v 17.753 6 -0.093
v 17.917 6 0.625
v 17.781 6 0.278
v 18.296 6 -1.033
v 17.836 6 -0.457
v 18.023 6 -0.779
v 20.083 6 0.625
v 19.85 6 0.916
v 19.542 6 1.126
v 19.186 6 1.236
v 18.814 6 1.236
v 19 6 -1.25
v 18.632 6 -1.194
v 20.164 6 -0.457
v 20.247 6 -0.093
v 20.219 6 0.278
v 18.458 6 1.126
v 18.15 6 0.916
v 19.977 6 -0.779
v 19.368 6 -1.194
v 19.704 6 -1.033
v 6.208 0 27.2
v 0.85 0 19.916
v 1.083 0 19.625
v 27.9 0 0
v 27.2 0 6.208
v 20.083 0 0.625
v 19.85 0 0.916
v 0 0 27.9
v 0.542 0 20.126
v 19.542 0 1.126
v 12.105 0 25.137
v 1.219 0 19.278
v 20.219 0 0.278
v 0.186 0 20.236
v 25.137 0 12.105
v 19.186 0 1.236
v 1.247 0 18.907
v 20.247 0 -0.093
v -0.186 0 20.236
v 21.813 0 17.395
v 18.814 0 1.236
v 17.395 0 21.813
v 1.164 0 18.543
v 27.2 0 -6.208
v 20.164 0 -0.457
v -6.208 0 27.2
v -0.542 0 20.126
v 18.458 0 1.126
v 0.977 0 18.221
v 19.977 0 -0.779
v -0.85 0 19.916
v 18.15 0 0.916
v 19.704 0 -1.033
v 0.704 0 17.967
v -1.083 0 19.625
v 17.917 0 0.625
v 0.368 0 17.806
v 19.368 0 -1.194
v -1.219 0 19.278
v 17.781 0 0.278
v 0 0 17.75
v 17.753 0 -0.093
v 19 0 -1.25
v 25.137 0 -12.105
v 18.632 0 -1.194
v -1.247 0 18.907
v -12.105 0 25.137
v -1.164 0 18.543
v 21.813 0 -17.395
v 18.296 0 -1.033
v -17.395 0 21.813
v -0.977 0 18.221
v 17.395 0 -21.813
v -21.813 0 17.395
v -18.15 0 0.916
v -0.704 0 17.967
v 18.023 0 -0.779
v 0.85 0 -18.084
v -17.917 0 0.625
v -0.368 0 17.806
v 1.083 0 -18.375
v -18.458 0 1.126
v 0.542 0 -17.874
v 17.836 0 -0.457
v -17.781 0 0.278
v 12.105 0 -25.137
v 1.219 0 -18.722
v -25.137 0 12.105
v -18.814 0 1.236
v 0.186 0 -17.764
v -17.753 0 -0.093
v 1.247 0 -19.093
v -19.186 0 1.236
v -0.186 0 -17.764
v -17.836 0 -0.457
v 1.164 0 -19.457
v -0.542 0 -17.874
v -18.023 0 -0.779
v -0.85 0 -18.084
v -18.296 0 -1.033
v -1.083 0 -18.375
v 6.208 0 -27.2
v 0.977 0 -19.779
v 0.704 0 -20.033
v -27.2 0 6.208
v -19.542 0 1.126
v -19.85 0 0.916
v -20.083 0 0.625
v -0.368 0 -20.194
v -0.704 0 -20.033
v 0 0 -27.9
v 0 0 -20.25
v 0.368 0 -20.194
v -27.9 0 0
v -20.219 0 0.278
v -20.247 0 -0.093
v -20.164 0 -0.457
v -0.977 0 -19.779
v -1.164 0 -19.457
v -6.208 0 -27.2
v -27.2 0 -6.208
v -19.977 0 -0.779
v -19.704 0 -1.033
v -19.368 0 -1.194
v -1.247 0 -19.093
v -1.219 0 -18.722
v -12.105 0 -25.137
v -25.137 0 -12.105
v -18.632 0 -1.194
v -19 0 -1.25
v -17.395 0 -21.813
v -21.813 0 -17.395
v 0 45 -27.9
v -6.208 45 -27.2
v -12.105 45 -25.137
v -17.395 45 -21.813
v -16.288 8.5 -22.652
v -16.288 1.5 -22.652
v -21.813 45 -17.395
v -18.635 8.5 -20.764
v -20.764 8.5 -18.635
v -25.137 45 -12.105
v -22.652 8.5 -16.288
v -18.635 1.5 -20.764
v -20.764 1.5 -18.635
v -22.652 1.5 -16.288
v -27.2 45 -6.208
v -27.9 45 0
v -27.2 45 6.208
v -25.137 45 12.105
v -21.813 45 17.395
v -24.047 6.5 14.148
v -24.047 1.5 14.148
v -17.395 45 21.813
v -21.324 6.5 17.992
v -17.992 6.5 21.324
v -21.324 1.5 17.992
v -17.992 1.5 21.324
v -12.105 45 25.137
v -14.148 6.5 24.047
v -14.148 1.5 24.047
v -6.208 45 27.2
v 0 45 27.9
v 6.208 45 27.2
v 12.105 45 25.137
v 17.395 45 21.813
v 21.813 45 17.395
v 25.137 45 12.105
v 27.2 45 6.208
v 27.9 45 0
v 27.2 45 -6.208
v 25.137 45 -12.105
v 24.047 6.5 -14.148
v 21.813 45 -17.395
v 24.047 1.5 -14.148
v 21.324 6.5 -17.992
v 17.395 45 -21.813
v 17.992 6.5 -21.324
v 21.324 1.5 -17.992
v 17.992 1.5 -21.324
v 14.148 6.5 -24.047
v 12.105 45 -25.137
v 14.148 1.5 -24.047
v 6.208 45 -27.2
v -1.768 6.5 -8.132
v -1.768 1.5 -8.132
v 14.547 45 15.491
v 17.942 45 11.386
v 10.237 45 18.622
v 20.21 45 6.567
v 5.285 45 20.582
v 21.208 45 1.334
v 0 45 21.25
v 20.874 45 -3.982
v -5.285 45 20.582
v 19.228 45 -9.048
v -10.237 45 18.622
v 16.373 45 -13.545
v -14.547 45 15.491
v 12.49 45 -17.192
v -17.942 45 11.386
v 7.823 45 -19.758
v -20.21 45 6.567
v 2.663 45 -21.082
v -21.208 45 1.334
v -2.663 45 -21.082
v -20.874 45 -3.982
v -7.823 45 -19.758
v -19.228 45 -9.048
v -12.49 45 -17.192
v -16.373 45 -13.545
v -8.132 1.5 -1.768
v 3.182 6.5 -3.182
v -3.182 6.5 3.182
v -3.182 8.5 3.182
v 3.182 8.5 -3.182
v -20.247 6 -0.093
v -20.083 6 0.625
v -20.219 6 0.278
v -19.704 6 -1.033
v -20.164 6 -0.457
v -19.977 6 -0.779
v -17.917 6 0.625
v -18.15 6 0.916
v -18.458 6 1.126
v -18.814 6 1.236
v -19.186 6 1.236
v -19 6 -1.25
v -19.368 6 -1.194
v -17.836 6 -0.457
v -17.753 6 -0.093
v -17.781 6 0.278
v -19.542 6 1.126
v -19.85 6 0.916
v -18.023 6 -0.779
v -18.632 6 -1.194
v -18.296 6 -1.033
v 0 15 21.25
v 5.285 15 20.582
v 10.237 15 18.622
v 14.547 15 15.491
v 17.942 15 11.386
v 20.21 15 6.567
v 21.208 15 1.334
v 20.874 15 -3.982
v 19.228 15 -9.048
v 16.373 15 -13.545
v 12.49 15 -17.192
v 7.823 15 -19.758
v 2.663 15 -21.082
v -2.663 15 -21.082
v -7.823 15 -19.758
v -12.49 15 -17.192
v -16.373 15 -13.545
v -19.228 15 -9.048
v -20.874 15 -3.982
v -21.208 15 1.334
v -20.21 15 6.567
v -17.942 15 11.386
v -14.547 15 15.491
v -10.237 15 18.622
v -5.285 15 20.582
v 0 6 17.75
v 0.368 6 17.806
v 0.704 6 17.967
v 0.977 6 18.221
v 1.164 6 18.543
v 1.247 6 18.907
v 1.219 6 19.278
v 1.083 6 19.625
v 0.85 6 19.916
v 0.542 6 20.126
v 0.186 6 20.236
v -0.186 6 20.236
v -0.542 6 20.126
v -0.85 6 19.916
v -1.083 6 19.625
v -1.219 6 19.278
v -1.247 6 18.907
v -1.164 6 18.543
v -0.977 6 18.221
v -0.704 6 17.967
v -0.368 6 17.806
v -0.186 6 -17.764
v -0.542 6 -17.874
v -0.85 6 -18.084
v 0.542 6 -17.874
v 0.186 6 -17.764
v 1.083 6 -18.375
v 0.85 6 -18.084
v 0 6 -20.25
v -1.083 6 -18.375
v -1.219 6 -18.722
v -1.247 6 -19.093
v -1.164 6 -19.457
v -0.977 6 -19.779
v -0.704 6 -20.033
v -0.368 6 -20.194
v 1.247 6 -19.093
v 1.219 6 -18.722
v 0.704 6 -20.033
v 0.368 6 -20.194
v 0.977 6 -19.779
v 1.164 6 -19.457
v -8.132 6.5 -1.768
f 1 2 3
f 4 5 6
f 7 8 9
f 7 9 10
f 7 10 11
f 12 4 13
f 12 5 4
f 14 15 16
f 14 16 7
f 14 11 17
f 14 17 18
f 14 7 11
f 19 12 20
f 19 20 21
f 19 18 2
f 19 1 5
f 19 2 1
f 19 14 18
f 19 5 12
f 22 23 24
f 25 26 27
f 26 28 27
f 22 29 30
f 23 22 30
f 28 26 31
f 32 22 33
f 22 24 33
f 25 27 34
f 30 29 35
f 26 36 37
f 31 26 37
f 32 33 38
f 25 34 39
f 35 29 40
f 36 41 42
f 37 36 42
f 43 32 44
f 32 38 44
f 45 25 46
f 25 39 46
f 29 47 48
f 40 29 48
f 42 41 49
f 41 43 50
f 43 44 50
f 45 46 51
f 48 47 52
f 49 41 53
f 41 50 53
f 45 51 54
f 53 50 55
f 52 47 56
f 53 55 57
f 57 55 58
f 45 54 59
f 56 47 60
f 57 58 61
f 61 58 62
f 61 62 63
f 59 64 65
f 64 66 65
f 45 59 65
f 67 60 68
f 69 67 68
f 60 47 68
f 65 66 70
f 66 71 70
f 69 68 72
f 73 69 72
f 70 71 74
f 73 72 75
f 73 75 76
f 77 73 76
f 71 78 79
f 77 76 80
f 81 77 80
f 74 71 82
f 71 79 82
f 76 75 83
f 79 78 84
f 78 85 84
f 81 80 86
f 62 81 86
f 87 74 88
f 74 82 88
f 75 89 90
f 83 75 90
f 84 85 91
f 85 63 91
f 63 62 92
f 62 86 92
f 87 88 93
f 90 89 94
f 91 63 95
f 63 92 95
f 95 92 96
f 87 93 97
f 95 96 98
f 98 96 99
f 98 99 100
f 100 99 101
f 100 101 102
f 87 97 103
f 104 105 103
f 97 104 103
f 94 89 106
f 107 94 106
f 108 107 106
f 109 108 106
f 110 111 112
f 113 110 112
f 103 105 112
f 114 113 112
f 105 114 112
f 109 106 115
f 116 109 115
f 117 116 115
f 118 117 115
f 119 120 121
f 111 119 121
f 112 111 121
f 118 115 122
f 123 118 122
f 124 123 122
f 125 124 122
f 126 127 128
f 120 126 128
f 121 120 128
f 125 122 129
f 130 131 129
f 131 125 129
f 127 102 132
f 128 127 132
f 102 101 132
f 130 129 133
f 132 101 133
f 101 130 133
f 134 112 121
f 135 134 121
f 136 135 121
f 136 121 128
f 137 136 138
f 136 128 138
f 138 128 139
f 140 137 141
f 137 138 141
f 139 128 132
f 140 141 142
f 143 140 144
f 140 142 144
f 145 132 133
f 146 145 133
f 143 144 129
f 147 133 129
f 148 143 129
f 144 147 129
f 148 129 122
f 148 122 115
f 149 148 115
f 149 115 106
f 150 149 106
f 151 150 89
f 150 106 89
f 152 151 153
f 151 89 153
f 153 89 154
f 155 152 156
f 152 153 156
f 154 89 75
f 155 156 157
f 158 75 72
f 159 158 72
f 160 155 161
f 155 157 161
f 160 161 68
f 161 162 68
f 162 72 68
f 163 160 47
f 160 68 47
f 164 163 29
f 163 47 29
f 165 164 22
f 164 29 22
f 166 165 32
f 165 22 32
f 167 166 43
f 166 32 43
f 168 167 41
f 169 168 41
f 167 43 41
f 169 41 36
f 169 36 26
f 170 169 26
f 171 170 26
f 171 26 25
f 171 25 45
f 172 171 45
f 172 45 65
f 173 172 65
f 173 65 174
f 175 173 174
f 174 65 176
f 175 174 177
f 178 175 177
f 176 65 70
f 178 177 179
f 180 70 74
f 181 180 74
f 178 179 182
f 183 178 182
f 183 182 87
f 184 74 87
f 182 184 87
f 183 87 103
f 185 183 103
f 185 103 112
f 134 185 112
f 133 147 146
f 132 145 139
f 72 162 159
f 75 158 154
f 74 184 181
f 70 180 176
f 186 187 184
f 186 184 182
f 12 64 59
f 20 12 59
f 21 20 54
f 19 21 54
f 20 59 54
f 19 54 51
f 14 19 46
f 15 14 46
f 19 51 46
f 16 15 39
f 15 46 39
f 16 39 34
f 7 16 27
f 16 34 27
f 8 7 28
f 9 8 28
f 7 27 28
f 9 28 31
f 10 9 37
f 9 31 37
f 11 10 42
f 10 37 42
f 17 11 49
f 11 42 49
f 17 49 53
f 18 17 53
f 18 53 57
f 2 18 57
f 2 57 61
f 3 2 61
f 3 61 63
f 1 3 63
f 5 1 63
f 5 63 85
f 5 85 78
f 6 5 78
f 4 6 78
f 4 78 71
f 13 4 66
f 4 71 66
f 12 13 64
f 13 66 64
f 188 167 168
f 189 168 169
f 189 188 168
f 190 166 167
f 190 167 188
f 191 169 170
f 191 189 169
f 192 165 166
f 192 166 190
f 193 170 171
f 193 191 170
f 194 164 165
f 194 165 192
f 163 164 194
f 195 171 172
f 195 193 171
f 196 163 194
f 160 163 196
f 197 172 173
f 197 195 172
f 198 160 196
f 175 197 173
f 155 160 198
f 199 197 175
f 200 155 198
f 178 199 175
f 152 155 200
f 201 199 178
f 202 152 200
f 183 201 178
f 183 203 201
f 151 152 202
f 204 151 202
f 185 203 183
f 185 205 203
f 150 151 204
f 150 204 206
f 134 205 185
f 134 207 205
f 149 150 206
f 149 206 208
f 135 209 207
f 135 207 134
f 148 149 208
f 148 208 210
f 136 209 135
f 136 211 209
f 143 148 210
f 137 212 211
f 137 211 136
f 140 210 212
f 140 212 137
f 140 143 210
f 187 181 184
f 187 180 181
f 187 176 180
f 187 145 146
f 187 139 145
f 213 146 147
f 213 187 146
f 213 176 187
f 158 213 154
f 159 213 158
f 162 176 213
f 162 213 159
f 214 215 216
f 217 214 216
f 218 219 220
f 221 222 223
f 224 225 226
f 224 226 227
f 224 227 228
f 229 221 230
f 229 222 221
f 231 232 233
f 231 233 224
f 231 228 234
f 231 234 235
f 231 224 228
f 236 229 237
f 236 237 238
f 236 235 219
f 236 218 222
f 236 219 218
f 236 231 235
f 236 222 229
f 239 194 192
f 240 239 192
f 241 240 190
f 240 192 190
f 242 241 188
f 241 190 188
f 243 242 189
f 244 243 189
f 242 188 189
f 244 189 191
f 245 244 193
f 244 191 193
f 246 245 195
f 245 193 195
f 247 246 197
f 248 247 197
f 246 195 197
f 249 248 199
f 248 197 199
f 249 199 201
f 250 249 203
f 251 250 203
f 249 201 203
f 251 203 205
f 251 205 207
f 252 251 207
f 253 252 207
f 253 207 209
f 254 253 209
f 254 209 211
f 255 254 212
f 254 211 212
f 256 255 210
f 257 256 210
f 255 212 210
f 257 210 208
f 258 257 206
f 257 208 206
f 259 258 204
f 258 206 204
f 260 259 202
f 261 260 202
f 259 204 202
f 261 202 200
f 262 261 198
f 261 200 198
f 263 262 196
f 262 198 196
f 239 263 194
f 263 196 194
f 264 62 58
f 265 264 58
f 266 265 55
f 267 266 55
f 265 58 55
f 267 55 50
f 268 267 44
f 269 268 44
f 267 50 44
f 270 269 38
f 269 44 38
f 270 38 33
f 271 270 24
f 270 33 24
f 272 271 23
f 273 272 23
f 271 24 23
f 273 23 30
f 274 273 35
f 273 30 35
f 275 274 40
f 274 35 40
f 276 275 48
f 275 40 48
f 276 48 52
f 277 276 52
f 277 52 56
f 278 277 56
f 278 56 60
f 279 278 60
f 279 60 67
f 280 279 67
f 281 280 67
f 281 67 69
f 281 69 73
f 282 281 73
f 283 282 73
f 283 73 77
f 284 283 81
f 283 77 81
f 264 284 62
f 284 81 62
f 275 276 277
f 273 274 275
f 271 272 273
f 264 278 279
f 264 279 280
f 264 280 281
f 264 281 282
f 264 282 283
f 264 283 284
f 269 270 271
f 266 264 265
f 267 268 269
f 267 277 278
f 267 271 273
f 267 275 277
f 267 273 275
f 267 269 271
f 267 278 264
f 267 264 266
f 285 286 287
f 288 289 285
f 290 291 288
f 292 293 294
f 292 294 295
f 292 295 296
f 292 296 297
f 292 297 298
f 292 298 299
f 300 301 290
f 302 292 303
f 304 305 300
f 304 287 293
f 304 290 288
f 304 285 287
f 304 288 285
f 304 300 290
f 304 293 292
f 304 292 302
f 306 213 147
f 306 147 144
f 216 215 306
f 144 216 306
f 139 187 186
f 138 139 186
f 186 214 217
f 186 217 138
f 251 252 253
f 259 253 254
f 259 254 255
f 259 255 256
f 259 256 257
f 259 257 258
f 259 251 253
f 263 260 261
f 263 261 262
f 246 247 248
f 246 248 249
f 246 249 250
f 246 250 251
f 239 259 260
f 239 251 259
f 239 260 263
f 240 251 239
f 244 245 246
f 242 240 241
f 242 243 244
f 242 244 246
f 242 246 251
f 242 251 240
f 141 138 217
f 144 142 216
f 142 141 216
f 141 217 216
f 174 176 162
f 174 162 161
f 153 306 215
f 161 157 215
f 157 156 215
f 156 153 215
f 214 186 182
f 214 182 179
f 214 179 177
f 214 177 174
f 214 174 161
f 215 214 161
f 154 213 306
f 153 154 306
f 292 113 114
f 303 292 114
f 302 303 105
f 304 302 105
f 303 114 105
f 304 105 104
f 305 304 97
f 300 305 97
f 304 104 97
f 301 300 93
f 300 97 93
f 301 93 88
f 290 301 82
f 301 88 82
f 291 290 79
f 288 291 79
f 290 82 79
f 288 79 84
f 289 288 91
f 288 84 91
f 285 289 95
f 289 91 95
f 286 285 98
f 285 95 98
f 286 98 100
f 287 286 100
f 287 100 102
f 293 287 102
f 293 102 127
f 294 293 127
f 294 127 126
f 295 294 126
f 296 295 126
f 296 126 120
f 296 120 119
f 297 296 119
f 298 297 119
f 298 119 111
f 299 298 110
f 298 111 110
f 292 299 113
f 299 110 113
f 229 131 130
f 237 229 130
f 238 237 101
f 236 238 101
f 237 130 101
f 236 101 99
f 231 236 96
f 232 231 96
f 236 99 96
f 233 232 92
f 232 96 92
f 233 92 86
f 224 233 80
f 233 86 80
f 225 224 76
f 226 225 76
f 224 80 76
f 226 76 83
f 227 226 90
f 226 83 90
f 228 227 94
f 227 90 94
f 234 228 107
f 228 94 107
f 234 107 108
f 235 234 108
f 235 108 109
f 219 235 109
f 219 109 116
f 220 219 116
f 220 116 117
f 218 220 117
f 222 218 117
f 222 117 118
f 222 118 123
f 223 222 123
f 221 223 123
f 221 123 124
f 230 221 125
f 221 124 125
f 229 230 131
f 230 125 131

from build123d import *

# Parameters (mm, degrees)
SKETCH_1_R          = 27.9
EXTRUDE_1_DEPTH     = 45
SKETCH_2_R          = 21.25
CUT_EXTRUDE_1_DEPTH = 30
SKETCH_3_R          = 1.25
CUT_EXTRUDE_2_DEPTH = 6
SKETCH_7_W          = 5
SKETCH_7_H          = 14
CUT_EXTRUDE_3_DEPTH = 45
SKETCH_8_W          = 7
SKETCH_8_H          = 9
CUT_EXTRUDE_4_DEPTH = 90


with BuildPart() as part:
    # 草图1 → 凸台-拉伸1 (new body)
    with BuildSketch(Plane(origin=(0, 0, 0), x_dir=(1, 0, 0), z_dir=(0, 1, 0))):
        Circle(SKETCH_1_R)
    extrude(amount=EXTRUDE_1_DEPTH)

    # 草图2 → 切除-拉伸1 (cut)
    with BuildSketch(Plane(origin=(0, 45, 0), x_dir=(1, 0, 0), z_dir=(0, 1, 0))):
        Circle(SKETCH_2_R)
    extrude(amount=-CUT_EXTRUDE_1_DEPTH, mode=Mode.SUBTRACT)

    # 草图3 → 切除-拉伸2 (cut)
    with BuildSketch(Plane.XZ):
        with Locations((-19, 0)):
            Circle(SKETCH_3_R)
        with Locations((0, 19)):
            Circle(SKETCH_3_R)
        with Locations((19, 0)):
            Circle(SKETCH_3_R)
        with Locations((0, -19)):
            Circle(SKETCH_3_R)
    extrude(amount=-CUT_EXTRUDE_2_DEPTH, mode=Mode.SUBTRACT)

    # 草图7 → 切除-拉伸3 (cut, symmetric)
    with BuildSketch(Plane(origin=(0, 0, 0), x_dir=(0, 1, 0), z_dir=(0.7071067811865438, 0, -0.7071067811865512))):
        with Locations((4, 0)):
            Rectangle(SKETCH_7_W, SKETCH_7_H)
    extrude(amount=CUT_EXTRUDE_3_DEPTH, both=True, mode=Mode.SUBTRACT)

    # 草图8 → 切除-拉伸4 (cut)
    with BuildSketch(Plane(origin=(0, 0, 0), x_dir=(0, 1, 0), z_dir=(0.7071067811865488, 0, 0.7071067811865464))):
        with Locations((5, 0)):
            Rectangle(SKETCH_8_W, SKETCH_8_H)
    extrude(amount=-CUT_EXTRUDE_4_DEPTH, mode=Mode.SUBTRACT)


solid = part.part
